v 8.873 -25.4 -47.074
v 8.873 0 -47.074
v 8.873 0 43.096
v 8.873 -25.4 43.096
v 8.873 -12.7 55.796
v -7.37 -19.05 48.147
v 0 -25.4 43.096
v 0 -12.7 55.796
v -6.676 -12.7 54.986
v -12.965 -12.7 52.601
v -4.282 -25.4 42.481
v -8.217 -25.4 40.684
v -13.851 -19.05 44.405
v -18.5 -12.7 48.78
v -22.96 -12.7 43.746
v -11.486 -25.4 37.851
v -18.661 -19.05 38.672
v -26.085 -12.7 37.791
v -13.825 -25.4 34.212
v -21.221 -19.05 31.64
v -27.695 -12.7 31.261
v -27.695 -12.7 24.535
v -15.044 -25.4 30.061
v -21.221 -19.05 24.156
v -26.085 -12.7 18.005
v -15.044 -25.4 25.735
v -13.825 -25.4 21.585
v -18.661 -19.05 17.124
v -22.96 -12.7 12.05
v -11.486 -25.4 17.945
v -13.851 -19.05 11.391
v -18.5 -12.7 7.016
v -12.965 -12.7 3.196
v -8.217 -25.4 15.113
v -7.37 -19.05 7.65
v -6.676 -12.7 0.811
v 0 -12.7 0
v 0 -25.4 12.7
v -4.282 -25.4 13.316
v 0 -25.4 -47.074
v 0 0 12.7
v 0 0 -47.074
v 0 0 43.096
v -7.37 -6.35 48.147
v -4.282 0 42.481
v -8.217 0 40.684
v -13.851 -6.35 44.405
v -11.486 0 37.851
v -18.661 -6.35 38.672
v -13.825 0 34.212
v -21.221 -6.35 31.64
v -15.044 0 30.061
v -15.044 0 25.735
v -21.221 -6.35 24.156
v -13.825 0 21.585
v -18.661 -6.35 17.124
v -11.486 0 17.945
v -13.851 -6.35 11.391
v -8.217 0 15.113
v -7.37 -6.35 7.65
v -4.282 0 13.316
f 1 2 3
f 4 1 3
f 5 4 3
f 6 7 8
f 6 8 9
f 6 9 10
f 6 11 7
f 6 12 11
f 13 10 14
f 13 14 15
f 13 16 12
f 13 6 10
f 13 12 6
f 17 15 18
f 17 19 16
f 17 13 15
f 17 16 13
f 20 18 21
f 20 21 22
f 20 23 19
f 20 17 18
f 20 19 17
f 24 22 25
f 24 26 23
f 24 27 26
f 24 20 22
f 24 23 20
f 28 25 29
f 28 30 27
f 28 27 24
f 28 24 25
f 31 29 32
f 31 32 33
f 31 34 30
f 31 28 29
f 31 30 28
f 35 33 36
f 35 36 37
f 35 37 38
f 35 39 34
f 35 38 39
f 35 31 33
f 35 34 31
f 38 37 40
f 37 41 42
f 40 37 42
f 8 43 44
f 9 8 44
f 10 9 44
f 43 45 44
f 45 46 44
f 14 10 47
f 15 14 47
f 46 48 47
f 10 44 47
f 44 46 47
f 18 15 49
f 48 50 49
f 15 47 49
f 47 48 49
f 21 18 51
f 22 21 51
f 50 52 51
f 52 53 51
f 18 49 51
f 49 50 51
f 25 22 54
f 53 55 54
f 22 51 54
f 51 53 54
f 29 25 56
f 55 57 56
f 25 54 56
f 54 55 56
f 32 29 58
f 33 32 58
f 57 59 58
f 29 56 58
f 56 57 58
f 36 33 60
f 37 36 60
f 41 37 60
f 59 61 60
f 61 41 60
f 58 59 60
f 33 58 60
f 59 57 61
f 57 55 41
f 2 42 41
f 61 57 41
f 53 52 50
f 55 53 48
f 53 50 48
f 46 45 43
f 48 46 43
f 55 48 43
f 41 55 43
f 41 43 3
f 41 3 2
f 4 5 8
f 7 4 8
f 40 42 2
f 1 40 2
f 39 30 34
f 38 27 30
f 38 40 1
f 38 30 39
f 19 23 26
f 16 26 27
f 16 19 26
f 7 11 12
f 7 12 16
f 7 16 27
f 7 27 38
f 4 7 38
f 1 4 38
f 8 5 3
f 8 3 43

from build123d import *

# Parameters (mm, degrees)
F1_DEPTH = 25.4
F2_SIZE  = 12.69999


# Not quite as in the source:
# - a fillet or chamfer is up to 0.001 mm smaller than in the source, because OpenCascade refuses the exact size


with BuildPart() as f1:
    # F0 (on Front) → F1 (new body)
    with BuildSketch(Plane.XZ):
        with BuildLine():
            Line((8.873289451, 55.7964481413), (0, 55.7964481413))
            ThreePointArc((0, 55.7964481413), (-27.8982240707, 27.8982240707), (0, 0))
            Line((0, 0), (0, -47.0735542476))
            Line((0, -47.0735542476), (8.873289451, -47.0735542476))
            Line((8.873289451, -47.0735542476), (8.873289451, 55.7964481413))
        make_face()
    extrude(amount=F1_DEPTH)

    # F2 (size 12.7 in the source; OpenCascade refuses exactly that, so slightly less here)
    f2_edges = [f1.edges().sort_by_distance(p)[0] for p in [
        (-27.898224, -25.4, 27.898224),
        (-27.898224, 0, 27.898224),
    ]]
    chamfer(f2_edges, length=F2_SIZE)


solid = f1.part
